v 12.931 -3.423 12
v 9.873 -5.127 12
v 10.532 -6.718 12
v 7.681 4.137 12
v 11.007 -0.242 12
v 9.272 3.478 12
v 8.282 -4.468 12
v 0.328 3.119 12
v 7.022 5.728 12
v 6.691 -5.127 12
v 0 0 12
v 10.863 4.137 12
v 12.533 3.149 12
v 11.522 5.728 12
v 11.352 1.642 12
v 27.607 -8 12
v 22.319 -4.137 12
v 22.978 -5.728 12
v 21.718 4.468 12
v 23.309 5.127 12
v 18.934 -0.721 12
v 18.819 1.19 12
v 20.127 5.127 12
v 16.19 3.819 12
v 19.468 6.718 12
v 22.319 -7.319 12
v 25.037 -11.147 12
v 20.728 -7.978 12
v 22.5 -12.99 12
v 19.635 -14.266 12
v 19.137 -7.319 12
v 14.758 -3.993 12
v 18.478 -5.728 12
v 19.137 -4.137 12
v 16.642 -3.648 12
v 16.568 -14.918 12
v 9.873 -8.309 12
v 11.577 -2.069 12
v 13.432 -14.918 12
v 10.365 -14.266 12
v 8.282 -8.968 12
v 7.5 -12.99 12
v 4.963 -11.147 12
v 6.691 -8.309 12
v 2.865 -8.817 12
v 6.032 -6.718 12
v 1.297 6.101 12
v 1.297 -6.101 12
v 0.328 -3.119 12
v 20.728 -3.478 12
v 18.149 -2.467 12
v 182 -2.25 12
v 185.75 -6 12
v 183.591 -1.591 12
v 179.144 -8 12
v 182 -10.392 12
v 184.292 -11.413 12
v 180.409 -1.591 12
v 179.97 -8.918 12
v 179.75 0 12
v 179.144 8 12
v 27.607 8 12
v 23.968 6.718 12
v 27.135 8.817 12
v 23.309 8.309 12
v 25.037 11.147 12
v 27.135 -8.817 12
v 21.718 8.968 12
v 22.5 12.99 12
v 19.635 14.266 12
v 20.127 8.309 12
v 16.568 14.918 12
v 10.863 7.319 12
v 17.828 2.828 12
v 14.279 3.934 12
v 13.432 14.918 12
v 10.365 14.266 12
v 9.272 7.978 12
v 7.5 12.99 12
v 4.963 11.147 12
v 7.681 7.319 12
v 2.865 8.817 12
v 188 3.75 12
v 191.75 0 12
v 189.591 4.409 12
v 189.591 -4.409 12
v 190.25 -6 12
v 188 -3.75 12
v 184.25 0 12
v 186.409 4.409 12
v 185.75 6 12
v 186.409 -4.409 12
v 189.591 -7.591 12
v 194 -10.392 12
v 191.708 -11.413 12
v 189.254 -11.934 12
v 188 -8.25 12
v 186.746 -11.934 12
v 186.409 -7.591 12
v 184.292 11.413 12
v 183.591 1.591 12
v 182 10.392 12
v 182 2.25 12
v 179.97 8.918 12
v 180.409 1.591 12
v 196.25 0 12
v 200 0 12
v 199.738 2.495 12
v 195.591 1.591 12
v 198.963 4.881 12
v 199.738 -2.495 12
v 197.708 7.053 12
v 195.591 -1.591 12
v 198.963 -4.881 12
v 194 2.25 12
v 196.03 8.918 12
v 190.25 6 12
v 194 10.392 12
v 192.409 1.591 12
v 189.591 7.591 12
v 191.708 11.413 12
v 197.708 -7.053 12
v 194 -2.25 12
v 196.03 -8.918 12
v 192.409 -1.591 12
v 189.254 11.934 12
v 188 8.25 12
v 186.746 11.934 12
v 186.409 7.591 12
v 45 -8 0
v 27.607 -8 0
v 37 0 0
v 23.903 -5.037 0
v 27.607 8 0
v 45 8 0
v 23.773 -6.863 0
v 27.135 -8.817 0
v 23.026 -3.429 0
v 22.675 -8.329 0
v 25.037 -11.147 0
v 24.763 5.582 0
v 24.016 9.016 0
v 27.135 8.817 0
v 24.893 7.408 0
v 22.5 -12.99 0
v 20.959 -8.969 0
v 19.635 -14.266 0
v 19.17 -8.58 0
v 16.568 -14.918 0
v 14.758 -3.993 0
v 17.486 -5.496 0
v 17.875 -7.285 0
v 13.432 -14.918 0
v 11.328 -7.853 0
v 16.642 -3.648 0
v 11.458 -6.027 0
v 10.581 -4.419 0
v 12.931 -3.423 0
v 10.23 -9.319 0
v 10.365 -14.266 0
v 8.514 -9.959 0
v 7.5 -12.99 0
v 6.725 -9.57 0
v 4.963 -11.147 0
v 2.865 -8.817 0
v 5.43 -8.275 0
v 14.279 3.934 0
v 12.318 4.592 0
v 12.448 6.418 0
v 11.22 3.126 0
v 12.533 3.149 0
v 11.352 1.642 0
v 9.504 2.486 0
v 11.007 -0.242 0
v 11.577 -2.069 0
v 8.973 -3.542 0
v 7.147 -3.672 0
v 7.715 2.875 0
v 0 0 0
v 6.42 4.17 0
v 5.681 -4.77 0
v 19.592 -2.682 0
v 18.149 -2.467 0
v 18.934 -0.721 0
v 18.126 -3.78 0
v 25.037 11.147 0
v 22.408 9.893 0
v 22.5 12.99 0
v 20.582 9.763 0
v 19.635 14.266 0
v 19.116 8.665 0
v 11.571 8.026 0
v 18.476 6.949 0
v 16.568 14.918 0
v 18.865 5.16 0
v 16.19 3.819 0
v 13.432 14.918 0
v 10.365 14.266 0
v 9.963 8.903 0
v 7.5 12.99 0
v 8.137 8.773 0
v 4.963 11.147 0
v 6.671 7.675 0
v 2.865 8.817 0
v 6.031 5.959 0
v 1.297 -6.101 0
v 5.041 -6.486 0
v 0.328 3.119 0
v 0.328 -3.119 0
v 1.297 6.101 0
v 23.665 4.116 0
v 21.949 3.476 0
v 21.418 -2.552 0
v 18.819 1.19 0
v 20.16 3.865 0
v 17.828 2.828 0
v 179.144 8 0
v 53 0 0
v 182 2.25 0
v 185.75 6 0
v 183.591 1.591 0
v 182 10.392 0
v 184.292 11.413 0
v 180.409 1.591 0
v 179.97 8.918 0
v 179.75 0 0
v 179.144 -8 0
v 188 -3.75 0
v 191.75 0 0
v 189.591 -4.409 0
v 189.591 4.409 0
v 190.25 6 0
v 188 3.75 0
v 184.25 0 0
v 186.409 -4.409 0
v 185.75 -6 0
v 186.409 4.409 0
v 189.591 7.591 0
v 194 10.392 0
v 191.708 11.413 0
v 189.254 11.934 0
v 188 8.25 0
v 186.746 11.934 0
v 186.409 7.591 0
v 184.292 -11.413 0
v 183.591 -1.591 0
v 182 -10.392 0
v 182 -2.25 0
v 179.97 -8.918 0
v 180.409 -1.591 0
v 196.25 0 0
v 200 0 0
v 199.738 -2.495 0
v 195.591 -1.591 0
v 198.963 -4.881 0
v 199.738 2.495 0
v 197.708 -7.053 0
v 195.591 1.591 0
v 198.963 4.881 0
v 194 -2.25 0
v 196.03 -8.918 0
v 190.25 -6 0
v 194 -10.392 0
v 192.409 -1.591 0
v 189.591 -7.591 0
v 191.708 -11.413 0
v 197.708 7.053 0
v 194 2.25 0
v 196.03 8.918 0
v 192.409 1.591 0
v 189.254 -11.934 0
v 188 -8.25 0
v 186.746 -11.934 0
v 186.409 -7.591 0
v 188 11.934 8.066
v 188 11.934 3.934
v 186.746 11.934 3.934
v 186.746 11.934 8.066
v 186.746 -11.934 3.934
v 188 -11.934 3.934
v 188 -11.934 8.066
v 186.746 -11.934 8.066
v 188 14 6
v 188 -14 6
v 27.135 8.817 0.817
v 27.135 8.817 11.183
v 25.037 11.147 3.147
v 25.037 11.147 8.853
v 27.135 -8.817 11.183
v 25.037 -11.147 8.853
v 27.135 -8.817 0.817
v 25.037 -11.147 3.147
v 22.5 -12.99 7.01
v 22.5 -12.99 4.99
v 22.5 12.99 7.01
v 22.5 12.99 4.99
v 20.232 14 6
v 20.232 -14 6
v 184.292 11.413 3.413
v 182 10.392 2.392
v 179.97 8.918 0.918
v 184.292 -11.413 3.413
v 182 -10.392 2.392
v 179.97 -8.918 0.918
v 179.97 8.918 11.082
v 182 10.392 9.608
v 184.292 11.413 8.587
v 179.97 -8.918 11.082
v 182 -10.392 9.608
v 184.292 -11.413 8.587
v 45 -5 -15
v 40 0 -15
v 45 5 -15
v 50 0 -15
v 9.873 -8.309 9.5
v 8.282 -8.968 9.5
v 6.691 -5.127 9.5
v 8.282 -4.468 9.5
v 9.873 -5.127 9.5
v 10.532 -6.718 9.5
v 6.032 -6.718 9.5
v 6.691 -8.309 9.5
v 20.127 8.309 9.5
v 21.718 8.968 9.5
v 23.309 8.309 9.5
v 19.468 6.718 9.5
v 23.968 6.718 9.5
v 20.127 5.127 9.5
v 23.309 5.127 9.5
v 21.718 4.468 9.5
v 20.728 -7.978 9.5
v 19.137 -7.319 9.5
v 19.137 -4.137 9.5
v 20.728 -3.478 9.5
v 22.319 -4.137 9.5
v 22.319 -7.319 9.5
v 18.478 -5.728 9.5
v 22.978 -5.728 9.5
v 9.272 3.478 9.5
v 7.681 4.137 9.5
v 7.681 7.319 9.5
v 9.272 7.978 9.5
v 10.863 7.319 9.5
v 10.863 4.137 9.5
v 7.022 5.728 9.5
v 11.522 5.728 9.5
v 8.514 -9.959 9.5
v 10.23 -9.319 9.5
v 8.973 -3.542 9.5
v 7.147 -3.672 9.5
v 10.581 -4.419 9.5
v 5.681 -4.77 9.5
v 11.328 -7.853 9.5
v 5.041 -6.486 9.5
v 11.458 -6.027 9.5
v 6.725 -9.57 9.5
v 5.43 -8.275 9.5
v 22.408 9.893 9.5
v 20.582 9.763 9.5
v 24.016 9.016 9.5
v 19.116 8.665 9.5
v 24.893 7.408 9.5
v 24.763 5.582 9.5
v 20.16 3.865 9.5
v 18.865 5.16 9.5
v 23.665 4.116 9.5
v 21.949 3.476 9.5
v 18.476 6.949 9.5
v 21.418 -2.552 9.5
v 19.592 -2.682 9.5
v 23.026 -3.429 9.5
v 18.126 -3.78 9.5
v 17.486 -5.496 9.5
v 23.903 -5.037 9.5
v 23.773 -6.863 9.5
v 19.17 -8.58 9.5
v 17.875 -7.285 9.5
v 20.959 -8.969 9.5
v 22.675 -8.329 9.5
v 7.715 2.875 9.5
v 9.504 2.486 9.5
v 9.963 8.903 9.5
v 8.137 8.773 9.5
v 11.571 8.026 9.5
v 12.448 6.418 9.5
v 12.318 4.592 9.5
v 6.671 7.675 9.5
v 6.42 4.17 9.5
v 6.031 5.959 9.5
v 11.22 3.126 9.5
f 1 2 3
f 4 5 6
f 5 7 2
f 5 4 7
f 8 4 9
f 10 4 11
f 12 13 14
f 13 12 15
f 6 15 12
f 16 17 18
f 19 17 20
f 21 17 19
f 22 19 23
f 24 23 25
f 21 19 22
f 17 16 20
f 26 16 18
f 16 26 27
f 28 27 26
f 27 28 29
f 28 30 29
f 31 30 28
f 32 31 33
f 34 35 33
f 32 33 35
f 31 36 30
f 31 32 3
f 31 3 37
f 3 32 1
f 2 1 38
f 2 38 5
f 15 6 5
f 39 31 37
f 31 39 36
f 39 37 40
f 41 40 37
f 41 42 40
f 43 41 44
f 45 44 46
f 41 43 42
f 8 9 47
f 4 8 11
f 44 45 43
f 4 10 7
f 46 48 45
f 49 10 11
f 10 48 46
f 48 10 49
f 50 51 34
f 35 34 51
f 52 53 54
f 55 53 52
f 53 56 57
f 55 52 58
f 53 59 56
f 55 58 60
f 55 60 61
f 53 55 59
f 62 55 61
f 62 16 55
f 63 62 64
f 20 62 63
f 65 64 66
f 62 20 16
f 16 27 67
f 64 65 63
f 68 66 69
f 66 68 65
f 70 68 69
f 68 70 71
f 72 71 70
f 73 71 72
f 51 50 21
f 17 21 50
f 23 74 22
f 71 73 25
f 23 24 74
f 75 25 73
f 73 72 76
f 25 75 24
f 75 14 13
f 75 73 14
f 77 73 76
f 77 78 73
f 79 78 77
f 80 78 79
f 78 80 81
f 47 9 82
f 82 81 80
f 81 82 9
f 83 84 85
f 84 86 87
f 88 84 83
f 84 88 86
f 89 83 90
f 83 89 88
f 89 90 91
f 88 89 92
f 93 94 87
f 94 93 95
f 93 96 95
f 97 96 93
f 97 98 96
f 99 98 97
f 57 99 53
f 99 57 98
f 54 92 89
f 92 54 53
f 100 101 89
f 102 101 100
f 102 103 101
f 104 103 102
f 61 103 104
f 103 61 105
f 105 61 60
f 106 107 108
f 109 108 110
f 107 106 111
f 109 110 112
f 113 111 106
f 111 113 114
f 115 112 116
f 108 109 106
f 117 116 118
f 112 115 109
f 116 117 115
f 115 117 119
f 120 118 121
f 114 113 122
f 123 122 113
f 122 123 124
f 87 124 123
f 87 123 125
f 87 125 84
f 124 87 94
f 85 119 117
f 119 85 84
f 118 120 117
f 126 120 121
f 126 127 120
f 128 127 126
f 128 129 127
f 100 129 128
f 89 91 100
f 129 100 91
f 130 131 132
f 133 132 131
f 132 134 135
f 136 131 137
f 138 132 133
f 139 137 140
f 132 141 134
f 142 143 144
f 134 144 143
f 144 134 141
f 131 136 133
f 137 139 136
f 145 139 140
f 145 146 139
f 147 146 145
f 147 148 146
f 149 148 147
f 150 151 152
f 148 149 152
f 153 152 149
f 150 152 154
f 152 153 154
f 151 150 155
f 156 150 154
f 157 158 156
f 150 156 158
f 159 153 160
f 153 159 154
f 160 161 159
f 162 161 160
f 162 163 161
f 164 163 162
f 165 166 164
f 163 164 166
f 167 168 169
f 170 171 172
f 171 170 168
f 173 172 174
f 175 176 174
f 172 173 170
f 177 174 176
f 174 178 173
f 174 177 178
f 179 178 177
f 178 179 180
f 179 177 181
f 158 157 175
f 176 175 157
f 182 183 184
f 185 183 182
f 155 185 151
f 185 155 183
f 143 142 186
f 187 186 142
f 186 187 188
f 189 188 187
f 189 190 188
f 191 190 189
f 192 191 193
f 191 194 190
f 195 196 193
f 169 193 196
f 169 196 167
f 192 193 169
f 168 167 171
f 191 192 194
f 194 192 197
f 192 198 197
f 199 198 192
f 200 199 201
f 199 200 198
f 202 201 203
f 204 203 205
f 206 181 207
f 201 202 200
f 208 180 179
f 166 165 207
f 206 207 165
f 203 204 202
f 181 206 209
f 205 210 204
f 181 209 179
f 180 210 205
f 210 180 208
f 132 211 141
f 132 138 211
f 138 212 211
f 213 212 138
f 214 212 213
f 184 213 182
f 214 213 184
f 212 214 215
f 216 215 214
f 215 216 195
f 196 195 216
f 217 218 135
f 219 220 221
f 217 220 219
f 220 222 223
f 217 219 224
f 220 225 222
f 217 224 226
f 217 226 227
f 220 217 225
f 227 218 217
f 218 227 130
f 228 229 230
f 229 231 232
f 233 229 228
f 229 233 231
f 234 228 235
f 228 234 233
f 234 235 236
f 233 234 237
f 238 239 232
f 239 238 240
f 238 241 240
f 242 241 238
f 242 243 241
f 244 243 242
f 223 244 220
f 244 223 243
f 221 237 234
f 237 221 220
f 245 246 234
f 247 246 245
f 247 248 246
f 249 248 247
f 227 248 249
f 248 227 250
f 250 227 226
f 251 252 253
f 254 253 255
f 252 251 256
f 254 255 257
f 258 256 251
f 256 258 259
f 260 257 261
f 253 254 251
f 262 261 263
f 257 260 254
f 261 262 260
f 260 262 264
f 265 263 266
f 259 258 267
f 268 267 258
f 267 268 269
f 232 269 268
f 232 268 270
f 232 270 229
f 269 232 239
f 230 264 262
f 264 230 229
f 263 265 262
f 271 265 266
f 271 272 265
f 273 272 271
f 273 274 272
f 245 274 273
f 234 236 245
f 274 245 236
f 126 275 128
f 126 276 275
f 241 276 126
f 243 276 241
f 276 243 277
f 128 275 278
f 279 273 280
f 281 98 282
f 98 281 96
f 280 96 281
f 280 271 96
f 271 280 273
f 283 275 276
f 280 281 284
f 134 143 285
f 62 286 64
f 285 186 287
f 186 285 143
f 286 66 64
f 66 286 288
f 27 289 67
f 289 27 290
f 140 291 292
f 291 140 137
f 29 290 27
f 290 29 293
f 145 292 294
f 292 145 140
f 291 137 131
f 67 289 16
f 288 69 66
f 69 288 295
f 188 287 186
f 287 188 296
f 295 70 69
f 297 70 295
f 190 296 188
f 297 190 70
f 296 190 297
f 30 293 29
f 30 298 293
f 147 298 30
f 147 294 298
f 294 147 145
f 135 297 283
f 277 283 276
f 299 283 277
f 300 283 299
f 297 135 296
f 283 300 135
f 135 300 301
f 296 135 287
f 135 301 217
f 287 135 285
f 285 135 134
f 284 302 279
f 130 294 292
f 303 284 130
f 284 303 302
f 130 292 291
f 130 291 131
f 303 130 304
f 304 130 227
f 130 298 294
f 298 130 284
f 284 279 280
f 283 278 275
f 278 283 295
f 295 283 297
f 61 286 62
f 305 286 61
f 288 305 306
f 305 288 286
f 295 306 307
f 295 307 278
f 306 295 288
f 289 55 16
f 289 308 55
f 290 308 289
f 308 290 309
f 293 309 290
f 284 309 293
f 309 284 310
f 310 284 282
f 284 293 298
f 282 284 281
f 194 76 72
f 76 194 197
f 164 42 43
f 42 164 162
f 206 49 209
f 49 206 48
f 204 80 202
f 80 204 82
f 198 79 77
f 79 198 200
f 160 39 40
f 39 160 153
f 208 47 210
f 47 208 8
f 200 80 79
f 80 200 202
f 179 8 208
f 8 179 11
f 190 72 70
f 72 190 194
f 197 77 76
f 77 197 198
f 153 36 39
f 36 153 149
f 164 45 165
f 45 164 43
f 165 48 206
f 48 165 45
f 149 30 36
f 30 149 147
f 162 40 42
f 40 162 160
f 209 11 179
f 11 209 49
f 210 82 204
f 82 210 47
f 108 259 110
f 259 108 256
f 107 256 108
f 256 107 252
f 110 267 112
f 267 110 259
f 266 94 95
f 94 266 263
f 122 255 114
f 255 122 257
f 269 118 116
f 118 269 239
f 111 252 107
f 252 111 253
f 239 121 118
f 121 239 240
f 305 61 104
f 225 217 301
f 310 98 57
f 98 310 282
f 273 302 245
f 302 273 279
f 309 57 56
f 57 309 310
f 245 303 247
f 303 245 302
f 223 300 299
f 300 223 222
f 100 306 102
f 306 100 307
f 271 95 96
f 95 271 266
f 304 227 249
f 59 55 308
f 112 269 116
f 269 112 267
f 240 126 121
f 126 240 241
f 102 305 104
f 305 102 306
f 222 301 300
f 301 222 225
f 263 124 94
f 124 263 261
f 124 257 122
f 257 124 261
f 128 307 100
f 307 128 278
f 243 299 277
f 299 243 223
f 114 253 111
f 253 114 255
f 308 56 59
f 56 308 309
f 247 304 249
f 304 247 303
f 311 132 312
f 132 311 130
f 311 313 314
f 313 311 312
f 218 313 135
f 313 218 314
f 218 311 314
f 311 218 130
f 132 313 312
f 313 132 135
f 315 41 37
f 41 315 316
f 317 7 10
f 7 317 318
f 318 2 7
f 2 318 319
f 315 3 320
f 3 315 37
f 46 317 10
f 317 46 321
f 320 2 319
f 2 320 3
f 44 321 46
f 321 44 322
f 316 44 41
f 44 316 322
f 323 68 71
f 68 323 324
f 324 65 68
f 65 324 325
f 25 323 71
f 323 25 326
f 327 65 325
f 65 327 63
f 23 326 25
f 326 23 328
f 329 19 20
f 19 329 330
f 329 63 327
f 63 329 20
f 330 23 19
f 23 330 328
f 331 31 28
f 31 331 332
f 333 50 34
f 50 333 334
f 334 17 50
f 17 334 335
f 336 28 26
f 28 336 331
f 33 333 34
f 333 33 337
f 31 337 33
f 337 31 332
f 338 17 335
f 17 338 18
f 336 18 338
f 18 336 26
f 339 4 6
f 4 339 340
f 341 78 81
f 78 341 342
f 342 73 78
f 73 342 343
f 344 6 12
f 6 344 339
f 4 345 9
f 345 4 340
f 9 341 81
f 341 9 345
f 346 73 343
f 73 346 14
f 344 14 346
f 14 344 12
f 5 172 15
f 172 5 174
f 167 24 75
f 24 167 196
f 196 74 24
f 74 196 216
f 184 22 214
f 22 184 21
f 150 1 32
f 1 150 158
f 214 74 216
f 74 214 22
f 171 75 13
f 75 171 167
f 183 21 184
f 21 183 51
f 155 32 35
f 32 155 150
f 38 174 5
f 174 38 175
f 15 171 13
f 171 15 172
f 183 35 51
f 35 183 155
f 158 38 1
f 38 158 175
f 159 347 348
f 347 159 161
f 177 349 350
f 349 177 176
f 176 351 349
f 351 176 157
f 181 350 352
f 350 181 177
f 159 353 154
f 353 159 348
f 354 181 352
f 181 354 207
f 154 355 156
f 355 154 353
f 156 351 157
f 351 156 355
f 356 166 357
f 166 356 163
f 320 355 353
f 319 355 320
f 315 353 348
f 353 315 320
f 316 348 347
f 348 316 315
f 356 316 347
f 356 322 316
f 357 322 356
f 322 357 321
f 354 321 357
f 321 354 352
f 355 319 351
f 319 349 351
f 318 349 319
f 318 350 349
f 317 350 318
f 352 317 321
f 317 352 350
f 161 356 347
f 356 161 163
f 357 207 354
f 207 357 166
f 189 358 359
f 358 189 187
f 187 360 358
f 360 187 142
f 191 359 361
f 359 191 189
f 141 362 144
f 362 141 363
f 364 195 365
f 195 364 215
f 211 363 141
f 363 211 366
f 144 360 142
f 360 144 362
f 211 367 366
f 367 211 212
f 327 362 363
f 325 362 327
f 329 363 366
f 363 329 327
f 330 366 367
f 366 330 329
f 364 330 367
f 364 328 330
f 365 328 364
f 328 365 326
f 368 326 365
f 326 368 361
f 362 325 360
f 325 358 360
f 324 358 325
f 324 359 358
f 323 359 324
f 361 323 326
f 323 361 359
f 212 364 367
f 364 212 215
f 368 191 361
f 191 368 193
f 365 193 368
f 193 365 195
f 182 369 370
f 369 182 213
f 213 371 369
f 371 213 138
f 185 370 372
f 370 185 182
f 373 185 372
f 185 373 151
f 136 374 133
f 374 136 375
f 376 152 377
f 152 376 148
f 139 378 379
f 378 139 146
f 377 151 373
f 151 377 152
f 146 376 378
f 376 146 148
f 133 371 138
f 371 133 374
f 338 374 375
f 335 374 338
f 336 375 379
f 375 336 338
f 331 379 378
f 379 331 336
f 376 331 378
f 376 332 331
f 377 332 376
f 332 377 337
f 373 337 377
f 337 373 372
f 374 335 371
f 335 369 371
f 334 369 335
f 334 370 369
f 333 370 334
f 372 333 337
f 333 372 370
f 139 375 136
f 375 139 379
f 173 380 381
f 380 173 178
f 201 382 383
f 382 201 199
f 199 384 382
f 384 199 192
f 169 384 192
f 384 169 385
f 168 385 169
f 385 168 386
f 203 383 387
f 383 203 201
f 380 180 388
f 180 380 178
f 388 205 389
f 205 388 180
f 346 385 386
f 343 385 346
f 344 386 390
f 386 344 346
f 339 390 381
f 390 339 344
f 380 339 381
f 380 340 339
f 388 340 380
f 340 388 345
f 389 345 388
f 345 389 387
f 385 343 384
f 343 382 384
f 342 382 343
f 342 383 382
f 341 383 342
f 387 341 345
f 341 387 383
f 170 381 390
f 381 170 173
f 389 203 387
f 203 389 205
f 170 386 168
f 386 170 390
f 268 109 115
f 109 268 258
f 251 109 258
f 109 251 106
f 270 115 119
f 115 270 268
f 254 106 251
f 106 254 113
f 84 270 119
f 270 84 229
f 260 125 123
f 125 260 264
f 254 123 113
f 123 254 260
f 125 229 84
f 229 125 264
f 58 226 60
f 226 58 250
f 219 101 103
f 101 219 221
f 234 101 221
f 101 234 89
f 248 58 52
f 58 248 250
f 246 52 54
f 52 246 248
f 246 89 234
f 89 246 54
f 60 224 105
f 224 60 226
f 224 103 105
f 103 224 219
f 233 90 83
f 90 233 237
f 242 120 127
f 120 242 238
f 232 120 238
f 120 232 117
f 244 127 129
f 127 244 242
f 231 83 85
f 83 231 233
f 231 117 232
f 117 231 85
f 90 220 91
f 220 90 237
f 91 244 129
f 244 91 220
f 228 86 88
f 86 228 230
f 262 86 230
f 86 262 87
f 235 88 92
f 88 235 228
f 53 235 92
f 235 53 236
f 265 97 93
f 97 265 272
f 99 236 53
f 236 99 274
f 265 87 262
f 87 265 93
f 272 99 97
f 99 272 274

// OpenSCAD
// prop radius ~128mm

module bldc() {
    cylinder(d=28, h=26);
}

// use similar to cube
module slot(l, d, h, center_x=false, center_y=false) {
    r = d/2;
    l2 = l - d;
    union() {
        if (center_x && center_y) {
            translate([-l2/2, -r]) cube([l2, r*2, h]);
            translate([l2/2, 0]) cylinder(r = r, h = h);
            translate([-l2/2, 0]) cylinder(r = r, h = h);
        } else if (center_x) {
            translate([-l2/2, 0]) cube([l2, r*2, h]);
            translate([l2/2, r]) cylinder(r = r, h = h);
            translate([-l2/2, r]) cylinder(r = r, h = h);
        } else if (center_y) {
            translate([r, -r]) cube([l2, r*2, h]);
            translate([l2+r, 0]) cylinder(r = r, h = h);
            translate([r, 0]) cylinder(r = r, h = h);
        } else {
            translate([r, 0]) cube([l2, r*2, h]);
            translate([l2+r, r]) cylinder(r = r, h = h);
            translate([r, r]) cylinder(r = r, h = h);
        }
    }
}

module arm() {
    bulb_d = 30;
    arm_w = 14;
    arm_t = 12;
    base_w = arm_w-arm_t/2;
    mount_t = arm_t;
    m_d1 = 16.2; // distance between closer together motor mounting holes
    m_d2 = 19; // and between the farther apart ones
    m_o = (bulb_d - m_d1) / 2; // offset from edge for mounting holes
    m_hole_d = 8; // center hole diameter
    arm_l = 200;
    connect_d = 24;
    bm_d = 12; // distance between body mounting holes
    inner1_arm_l = arm_l - bulb_d/2 - connect_d/2;
    inner2_arm_l = arm_l - bulb_d - connect_d;
    screw_hole_d = 4.5;
    screwhead_hole_d = 6.5;
    foot_t = 15;
    foot_base = base_w*2;
    foot_top = 10;
    foot_offset = 15;
    difference() {
        //cube([140, arm_w, mount_t]);
        union() {
            // motor mounting bulb
            translate([bulb_d/2, 0, 0])
                cylinder(d=bulb_d, h=mount_t);
            
            // main arm itself
            intersection(){
                difference() {
                    union() {
                        slot(arm_l, bulb_d, mount_t, center_y=true);
                        translate([bulb_d/2, -bulb_d/2, 0])
                            cube([inner1_arm_l-connect_d/4, bulb_d, arm_t]);
                    };
                    translate([bulb_d/2, 0, 0])
                        cylinder(d=bulb_d, h=arm_t);
                    translate([arm_l-connect_d/2, 0, 0]) {
                        cylinder(d=connect_d, h=arm_t);
                        // also disallow side on the outer half of the cylinder
                        #translate([0, -arm_w, 0])
                            cube([connect_d/2, arm_w*2, arm_t]);
                    }
                }
                // rectangularish version
                rotate([0, 90, 0]) {
                    linear_extrude(height = arm_l) {
                        polygon([[0, base_w], [-(arm_w-base_w), arm_w],
                                 [-(arm_w-base_w)*2, base_w], [-(arm_w-base_w)*2, -base_w],
                                 [-(arm_w-base_w), -arm_w], [0, -base_w]]);
                    };
                }
            }
            // body connecting mount area
            translate([arm_l-connect_d/2, 0, 0])
                cylinder(d=connect_d, h=mount_t);
            // landing feet (foot)
            translate([bulb_d+foot_offset, 0, -foot_t])
                cylinder(h=foot_t, d2=foot_base, d1=foot_top, $fn=4);
        }
        // motor mounting holes
        #translate([bulb_d/2, 0, 0]) {
            rotate([0, 0, 45]) {
                translate([-m_d2/2, 0, 0])
                    cylinder(d=screw_hole_d, h=mount_t);
                translate([m_d2/2, 0, 0])
                    cylinder(d=screw_hole_d, h=mount_t);
                translate([0, -m_d1/2, 0])
                    cylinder(d=screw_hole_d, h=mount_t);
                translate([0, m_d1/2, 0])
                    cylinder(d=screw_hole_d, h=mount_t);
                translate([0, 0, 0])
                    cylinder(d=m_hole_d, h=mount_t);
                // hole to allow screw head to come through part way
                translate([-m_d2/2, 0, 0])
                    cylinder(d=screwhead_hole_d, h=mount_t-2.5);
                translate([m_d2/2, 0, 0])
                    cylinder(d=screwhead_hole_d, h=mount_t-2.5);
                translate([0, -m_d1/2, 0])
                    cylinder(d=screwhead_hole_d, h=mount_t-2.5);
                translate([0, m_d1/2, 0])
                    cylinder(d=screwhead_hole_d, h=mount_t-2.5);
            }
        }
        // body mounting holes
        translate([arm_l-connect_d/2, 0, 0]) {
            translate([bm_d/2, 0, 0])
                cylinder(d=screw_hole_d, h=mount_t);
            translate([-bm_d/2, 0, 0])
                cylinder(d=screw_hole_d, h=mount_t);
            translate([0, bm_d/2, 0])
                cylinder(d=screw_hole_d, h=mount_t);
            translate([0, -bm_d/2, 0])
                cylinder(d=screw_hole_d, h=mount_t);
        }
    }

}

//bldc();
arm();
